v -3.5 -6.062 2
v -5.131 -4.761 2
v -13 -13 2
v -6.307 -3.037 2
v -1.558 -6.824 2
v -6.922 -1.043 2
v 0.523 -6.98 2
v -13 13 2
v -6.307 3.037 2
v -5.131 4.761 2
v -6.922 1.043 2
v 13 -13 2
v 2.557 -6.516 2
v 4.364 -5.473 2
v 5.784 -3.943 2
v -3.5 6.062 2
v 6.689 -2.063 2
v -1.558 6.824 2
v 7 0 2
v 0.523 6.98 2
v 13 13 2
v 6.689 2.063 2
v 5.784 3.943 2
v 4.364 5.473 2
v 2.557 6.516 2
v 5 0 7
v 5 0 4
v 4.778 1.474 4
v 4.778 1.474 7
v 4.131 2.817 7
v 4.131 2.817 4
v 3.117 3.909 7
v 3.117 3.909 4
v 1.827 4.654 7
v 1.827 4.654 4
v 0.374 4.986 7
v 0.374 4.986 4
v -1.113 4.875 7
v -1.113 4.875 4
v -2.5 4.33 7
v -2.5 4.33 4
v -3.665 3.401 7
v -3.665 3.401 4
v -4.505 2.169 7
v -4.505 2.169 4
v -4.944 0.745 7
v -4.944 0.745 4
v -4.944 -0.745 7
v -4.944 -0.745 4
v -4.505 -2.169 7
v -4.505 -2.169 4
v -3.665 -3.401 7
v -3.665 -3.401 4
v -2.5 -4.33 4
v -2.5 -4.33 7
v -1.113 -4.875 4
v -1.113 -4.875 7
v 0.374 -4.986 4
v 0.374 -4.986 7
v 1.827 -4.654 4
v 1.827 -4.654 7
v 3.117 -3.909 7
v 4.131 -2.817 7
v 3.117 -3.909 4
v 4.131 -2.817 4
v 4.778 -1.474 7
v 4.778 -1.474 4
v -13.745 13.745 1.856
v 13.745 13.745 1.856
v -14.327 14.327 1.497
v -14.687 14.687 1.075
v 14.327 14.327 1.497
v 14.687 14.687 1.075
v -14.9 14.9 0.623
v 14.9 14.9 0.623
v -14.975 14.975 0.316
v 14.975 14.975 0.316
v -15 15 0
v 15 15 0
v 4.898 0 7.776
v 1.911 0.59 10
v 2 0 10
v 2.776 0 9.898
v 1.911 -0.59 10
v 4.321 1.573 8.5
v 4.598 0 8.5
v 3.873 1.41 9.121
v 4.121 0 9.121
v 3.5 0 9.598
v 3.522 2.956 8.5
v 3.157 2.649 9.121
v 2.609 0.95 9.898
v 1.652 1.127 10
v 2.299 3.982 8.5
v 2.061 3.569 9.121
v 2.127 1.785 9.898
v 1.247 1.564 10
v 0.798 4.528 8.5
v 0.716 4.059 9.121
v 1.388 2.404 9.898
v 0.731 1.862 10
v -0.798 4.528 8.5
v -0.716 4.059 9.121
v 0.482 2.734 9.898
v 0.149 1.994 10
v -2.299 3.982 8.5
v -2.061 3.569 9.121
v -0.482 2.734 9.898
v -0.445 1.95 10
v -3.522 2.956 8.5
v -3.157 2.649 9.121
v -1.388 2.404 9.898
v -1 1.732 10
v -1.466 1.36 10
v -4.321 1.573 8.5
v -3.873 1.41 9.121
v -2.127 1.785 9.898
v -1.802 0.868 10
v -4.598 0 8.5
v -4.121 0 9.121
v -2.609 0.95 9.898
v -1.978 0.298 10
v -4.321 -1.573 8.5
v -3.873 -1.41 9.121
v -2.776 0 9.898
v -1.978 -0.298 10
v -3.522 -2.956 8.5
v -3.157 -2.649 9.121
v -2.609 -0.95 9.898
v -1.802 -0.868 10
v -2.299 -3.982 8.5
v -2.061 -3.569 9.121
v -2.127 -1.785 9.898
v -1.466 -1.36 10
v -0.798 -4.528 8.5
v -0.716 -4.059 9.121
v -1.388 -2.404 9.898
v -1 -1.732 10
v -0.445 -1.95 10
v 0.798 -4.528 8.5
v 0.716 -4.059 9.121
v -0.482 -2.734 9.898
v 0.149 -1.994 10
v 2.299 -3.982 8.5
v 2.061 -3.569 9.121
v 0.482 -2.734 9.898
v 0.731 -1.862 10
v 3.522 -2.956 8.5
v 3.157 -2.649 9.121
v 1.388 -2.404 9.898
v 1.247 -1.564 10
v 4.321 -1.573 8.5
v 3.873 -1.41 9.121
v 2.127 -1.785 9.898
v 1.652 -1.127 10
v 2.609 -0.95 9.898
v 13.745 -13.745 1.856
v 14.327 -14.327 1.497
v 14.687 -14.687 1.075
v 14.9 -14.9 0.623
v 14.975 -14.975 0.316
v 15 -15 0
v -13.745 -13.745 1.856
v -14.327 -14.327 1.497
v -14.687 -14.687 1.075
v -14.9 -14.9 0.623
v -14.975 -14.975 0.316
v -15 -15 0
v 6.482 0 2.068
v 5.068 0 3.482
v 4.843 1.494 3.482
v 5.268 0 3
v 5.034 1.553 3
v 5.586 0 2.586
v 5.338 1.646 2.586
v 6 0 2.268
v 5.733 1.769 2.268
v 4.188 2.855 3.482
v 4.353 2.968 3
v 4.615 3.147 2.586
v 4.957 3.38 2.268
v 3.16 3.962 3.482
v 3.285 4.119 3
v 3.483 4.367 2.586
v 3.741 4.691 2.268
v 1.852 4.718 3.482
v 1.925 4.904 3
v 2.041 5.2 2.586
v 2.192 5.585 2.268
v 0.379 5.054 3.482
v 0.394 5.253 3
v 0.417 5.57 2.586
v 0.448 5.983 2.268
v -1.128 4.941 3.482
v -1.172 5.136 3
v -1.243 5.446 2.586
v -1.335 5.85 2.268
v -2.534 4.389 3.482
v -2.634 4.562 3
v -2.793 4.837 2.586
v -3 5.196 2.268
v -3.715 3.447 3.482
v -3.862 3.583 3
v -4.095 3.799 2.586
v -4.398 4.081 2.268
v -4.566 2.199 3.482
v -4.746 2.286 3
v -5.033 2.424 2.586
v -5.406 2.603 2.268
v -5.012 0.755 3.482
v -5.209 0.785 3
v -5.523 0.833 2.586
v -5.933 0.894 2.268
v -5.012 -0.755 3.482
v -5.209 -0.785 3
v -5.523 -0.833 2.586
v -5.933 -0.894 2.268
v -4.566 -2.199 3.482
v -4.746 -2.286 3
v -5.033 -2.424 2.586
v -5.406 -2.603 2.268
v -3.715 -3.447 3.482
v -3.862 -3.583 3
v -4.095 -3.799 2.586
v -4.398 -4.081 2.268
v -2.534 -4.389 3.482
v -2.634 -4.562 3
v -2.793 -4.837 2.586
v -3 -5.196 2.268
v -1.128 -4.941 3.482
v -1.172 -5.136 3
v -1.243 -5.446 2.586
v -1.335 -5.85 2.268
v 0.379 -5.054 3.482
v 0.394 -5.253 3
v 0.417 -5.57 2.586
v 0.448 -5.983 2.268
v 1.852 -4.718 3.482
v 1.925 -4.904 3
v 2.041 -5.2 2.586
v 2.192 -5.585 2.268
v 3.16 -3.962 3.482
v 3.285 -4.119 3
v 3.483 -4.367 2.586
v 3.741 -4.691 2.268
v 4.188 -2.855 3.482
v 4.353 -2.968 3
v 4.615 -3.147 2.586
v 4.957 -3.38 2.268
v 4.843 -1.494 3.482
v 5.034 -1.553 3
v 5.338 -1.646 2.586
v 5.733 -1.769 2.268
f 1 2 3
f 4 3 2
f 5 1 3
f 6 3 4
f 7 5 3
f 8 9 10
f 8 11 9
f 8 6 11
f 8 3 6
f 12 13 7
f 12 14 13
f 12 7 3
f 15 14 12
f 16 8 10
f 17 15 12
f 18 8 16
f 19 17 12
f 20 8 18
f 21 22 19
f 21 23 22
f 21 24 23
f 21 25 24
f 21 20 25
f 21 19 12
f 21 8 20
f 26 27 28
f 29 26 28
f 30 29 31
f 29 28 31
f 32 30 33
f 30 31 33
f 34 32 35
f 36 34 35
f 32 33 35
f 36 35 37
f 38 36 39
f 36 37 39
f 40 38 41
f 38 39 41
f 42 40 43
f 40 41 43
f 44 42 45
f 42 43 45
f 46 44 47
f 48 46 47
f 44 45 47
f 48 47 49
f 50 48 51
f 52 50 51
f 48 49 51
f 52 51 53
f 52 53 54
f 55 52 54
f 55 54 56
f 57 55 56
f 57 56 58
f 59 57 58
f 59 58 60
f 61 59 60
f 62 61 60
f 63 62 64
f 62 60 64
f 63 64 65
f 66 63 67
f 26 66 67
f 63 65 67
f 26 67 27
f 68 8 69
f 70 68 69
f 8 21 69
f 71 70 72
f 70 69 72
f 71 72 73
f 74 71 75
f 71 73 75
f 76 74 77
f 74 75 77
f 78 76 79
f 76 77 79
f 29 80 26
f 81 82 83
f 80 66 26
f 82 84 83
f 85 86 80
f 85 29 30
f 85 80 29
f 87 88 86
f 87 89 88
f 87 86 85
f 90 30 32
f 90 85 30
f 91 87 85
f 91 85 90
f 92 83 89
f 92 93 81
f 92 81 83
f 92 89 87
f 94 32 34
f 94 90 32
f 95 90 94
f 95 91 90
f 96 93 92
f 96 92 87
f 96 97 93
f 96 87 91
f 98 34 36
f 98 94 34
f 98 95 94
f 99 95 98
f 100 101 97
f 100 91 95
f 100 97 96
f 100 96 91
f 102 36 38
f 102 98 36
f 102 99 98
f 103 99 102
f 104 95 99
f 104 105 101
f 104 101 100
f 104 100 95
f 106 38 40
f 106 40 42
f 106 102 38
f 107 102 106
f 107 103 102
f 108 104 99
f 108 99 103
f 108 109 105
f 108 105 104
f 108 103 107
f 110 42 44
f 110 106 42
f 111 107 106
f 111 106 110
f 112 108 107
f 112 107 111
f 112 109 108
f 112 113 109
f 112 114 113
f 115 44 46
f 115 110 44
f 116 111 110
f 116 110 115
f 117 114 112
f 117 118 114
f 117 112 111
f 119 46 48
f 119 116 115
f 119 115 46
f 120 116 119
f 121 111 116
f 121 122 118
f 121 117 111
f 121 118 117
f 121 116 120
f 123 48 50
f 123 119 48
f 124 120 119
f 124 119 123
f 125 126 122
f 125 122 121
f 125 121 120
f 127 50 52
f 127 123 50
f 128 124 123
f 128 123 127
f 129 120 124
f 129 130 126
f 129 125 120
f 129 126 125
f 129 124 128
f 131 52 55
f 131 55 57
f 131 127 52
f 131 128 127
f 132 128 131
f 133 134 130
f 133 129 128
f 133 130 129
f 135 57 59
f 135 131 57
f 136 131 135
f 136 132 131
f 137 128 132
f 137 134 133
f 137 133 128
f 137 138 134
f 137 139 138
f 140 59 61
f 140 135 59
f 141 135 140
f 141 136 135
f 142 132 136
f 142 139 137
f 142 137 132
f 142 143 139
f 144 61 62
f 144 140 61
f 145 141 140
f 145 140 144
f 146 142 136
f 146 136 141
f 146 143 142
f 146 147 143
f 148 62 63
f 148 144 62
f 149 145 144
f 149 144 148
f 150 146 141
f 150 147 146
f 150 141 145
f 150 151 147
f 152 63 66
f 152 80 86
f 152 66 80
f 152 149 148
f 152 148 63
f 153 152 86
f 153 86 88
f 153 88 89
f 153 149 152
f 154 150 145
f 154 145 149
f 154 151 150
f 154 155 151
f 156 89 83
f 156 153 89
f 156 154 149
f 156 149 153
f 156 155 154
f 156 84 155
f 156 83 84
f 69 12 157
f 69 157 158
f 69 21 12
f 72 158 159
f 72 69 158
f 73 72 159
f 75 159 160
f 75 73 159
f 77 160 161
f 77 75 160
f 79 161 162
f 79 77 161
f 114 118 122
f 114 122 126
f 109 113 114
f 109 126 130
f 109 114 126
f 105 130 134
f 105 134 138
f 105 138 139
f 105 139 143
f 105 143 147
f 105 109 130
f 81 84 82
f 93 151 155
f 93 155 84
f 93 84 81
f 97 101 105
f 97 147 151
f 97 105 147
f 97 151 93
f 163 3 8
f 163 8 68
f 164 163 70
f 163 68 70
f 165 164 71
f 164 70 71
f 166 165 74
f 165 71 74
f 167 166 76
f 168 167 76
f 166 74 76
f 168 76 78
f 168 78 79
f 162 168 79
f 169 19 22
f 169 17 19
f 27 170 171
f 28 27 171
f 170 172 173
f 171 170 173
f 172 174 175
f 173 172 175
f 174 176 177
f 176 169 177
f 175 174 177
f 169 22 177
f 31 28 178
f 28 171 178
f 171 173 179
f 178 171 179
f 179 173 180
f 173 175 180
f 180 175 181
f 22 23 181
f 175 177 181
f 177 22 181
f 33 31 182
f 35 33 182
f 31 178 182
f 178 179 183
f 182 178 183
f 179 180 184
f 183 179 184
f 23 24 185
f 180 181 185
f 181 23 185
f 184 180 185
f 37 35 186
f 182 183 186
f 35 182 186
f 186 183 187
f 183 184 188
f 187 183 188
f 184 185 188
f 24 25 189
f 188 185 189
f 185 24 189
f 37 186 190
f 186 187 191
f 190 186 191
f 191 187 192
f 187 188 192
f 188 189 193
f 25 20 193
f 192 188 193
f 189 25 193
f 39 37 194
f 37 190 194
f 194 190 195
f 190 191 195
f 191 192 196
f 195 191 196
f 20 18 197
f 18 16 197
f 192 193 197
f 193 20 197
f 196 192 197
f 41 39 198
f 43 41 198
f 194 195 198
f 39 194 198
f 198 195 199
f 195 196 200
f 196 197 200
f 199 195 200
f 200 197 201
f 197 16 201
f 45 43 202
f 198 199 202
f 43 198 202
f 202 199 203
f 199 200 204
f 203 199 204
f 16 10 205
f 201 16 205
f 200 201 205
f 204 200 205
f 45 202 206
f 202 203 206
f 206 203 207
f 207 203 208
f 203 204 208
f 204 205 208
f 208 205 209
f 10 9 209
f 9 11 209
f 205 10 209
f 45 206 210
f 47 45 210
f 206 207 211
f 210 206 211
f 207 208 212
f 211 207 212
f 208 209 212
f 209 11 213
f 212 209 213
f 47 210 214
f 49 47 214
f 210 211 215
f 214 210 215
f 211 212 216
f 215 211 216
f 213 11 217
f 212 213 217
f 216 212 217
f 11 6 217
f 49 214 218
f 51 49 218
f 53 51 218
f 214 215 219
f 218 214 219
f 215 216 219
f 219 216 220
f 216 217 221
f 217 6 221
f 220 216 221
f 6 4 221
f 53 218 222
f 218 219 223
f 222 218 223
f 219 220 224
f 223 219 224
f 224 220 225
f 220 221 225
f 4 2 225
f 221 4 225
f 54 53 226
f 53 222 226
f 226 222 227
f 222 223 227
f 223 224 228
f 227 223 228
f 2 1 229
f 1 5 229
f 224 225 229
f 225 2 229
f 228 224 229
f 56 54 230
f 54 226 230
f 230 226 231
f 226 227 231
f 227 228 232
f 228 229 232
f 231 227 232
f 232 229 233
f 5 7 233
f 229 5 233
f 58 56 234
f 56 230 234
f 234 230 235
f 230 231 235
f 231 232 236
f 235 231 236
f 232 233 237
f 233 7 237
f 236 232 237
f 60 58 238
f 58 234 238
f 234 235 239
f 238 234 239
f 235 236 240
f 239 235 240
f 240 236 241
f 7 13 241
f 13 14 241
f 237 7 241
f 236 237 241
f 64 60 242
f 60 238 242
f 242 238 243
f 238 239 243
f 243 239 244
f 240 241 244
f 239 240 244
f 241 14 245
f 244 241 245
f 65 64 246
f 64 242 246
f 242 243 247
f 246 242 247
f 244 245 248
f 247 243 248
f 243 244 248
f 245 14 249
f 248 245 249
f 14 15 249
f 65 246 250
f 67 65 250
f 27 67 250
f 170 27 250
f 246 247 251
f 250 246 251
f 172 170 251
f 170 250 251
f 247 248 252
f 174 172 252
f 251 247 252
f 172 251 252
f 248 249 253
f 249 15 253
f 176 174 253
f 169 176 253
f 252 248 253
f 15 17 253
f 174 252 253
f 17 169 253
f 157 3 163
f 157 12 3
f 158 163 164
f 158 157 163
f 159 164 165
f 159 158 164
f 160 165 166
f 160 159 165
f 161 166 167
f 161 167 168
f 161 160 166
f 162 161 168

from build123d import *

# Parameters (mm, degrees)
F0_W     = 30
F0_H     = 30
F1_DEPTH = 2
F2_R     = 5
F3_DEPTH = 8
F4_R     = 3
F5_R     = 1.99999


# Not quite as in the source:
# - a fillet or chamfer is up to 0.001 mm smaller than in the source, because OpenCascade refuses the exact size


with BuildPart() as f1:
    # F0 (on Top) → F1 (new body)
    with BuildSketch(Plane.XY):
        Rectangle(F0_W, F0_H)
    extrude(amount=F1_DEPTH)

    # F2 (on face) → F3 (join)
    with BuildSketch(Plane.XY.offset(2)):
        Circle(F2_R)
    extrude(amount=F3_DEPTH)

    # F4
    f4_edges = [f1.edges().sort_by_distance(p)[0] for p in [
        (-5, 0, 10),
    ]]
    fillet(f4_edges, radius=F4_R)

    # F5 (radius 2 in the source; OpenCascade refuses exactly that, so slightly less here)
    f5_edges = [f1.edges().sort_by_distance(p)[0] for p in [
        (0, -15, 2),
        (-15, 0, 2),
        (15, 0, 2),
        (0, 15, 2),
        (-5, 0, 2),
    ]]
    fillet(f5_edges, radius=F5_R)


solid = f1.part
